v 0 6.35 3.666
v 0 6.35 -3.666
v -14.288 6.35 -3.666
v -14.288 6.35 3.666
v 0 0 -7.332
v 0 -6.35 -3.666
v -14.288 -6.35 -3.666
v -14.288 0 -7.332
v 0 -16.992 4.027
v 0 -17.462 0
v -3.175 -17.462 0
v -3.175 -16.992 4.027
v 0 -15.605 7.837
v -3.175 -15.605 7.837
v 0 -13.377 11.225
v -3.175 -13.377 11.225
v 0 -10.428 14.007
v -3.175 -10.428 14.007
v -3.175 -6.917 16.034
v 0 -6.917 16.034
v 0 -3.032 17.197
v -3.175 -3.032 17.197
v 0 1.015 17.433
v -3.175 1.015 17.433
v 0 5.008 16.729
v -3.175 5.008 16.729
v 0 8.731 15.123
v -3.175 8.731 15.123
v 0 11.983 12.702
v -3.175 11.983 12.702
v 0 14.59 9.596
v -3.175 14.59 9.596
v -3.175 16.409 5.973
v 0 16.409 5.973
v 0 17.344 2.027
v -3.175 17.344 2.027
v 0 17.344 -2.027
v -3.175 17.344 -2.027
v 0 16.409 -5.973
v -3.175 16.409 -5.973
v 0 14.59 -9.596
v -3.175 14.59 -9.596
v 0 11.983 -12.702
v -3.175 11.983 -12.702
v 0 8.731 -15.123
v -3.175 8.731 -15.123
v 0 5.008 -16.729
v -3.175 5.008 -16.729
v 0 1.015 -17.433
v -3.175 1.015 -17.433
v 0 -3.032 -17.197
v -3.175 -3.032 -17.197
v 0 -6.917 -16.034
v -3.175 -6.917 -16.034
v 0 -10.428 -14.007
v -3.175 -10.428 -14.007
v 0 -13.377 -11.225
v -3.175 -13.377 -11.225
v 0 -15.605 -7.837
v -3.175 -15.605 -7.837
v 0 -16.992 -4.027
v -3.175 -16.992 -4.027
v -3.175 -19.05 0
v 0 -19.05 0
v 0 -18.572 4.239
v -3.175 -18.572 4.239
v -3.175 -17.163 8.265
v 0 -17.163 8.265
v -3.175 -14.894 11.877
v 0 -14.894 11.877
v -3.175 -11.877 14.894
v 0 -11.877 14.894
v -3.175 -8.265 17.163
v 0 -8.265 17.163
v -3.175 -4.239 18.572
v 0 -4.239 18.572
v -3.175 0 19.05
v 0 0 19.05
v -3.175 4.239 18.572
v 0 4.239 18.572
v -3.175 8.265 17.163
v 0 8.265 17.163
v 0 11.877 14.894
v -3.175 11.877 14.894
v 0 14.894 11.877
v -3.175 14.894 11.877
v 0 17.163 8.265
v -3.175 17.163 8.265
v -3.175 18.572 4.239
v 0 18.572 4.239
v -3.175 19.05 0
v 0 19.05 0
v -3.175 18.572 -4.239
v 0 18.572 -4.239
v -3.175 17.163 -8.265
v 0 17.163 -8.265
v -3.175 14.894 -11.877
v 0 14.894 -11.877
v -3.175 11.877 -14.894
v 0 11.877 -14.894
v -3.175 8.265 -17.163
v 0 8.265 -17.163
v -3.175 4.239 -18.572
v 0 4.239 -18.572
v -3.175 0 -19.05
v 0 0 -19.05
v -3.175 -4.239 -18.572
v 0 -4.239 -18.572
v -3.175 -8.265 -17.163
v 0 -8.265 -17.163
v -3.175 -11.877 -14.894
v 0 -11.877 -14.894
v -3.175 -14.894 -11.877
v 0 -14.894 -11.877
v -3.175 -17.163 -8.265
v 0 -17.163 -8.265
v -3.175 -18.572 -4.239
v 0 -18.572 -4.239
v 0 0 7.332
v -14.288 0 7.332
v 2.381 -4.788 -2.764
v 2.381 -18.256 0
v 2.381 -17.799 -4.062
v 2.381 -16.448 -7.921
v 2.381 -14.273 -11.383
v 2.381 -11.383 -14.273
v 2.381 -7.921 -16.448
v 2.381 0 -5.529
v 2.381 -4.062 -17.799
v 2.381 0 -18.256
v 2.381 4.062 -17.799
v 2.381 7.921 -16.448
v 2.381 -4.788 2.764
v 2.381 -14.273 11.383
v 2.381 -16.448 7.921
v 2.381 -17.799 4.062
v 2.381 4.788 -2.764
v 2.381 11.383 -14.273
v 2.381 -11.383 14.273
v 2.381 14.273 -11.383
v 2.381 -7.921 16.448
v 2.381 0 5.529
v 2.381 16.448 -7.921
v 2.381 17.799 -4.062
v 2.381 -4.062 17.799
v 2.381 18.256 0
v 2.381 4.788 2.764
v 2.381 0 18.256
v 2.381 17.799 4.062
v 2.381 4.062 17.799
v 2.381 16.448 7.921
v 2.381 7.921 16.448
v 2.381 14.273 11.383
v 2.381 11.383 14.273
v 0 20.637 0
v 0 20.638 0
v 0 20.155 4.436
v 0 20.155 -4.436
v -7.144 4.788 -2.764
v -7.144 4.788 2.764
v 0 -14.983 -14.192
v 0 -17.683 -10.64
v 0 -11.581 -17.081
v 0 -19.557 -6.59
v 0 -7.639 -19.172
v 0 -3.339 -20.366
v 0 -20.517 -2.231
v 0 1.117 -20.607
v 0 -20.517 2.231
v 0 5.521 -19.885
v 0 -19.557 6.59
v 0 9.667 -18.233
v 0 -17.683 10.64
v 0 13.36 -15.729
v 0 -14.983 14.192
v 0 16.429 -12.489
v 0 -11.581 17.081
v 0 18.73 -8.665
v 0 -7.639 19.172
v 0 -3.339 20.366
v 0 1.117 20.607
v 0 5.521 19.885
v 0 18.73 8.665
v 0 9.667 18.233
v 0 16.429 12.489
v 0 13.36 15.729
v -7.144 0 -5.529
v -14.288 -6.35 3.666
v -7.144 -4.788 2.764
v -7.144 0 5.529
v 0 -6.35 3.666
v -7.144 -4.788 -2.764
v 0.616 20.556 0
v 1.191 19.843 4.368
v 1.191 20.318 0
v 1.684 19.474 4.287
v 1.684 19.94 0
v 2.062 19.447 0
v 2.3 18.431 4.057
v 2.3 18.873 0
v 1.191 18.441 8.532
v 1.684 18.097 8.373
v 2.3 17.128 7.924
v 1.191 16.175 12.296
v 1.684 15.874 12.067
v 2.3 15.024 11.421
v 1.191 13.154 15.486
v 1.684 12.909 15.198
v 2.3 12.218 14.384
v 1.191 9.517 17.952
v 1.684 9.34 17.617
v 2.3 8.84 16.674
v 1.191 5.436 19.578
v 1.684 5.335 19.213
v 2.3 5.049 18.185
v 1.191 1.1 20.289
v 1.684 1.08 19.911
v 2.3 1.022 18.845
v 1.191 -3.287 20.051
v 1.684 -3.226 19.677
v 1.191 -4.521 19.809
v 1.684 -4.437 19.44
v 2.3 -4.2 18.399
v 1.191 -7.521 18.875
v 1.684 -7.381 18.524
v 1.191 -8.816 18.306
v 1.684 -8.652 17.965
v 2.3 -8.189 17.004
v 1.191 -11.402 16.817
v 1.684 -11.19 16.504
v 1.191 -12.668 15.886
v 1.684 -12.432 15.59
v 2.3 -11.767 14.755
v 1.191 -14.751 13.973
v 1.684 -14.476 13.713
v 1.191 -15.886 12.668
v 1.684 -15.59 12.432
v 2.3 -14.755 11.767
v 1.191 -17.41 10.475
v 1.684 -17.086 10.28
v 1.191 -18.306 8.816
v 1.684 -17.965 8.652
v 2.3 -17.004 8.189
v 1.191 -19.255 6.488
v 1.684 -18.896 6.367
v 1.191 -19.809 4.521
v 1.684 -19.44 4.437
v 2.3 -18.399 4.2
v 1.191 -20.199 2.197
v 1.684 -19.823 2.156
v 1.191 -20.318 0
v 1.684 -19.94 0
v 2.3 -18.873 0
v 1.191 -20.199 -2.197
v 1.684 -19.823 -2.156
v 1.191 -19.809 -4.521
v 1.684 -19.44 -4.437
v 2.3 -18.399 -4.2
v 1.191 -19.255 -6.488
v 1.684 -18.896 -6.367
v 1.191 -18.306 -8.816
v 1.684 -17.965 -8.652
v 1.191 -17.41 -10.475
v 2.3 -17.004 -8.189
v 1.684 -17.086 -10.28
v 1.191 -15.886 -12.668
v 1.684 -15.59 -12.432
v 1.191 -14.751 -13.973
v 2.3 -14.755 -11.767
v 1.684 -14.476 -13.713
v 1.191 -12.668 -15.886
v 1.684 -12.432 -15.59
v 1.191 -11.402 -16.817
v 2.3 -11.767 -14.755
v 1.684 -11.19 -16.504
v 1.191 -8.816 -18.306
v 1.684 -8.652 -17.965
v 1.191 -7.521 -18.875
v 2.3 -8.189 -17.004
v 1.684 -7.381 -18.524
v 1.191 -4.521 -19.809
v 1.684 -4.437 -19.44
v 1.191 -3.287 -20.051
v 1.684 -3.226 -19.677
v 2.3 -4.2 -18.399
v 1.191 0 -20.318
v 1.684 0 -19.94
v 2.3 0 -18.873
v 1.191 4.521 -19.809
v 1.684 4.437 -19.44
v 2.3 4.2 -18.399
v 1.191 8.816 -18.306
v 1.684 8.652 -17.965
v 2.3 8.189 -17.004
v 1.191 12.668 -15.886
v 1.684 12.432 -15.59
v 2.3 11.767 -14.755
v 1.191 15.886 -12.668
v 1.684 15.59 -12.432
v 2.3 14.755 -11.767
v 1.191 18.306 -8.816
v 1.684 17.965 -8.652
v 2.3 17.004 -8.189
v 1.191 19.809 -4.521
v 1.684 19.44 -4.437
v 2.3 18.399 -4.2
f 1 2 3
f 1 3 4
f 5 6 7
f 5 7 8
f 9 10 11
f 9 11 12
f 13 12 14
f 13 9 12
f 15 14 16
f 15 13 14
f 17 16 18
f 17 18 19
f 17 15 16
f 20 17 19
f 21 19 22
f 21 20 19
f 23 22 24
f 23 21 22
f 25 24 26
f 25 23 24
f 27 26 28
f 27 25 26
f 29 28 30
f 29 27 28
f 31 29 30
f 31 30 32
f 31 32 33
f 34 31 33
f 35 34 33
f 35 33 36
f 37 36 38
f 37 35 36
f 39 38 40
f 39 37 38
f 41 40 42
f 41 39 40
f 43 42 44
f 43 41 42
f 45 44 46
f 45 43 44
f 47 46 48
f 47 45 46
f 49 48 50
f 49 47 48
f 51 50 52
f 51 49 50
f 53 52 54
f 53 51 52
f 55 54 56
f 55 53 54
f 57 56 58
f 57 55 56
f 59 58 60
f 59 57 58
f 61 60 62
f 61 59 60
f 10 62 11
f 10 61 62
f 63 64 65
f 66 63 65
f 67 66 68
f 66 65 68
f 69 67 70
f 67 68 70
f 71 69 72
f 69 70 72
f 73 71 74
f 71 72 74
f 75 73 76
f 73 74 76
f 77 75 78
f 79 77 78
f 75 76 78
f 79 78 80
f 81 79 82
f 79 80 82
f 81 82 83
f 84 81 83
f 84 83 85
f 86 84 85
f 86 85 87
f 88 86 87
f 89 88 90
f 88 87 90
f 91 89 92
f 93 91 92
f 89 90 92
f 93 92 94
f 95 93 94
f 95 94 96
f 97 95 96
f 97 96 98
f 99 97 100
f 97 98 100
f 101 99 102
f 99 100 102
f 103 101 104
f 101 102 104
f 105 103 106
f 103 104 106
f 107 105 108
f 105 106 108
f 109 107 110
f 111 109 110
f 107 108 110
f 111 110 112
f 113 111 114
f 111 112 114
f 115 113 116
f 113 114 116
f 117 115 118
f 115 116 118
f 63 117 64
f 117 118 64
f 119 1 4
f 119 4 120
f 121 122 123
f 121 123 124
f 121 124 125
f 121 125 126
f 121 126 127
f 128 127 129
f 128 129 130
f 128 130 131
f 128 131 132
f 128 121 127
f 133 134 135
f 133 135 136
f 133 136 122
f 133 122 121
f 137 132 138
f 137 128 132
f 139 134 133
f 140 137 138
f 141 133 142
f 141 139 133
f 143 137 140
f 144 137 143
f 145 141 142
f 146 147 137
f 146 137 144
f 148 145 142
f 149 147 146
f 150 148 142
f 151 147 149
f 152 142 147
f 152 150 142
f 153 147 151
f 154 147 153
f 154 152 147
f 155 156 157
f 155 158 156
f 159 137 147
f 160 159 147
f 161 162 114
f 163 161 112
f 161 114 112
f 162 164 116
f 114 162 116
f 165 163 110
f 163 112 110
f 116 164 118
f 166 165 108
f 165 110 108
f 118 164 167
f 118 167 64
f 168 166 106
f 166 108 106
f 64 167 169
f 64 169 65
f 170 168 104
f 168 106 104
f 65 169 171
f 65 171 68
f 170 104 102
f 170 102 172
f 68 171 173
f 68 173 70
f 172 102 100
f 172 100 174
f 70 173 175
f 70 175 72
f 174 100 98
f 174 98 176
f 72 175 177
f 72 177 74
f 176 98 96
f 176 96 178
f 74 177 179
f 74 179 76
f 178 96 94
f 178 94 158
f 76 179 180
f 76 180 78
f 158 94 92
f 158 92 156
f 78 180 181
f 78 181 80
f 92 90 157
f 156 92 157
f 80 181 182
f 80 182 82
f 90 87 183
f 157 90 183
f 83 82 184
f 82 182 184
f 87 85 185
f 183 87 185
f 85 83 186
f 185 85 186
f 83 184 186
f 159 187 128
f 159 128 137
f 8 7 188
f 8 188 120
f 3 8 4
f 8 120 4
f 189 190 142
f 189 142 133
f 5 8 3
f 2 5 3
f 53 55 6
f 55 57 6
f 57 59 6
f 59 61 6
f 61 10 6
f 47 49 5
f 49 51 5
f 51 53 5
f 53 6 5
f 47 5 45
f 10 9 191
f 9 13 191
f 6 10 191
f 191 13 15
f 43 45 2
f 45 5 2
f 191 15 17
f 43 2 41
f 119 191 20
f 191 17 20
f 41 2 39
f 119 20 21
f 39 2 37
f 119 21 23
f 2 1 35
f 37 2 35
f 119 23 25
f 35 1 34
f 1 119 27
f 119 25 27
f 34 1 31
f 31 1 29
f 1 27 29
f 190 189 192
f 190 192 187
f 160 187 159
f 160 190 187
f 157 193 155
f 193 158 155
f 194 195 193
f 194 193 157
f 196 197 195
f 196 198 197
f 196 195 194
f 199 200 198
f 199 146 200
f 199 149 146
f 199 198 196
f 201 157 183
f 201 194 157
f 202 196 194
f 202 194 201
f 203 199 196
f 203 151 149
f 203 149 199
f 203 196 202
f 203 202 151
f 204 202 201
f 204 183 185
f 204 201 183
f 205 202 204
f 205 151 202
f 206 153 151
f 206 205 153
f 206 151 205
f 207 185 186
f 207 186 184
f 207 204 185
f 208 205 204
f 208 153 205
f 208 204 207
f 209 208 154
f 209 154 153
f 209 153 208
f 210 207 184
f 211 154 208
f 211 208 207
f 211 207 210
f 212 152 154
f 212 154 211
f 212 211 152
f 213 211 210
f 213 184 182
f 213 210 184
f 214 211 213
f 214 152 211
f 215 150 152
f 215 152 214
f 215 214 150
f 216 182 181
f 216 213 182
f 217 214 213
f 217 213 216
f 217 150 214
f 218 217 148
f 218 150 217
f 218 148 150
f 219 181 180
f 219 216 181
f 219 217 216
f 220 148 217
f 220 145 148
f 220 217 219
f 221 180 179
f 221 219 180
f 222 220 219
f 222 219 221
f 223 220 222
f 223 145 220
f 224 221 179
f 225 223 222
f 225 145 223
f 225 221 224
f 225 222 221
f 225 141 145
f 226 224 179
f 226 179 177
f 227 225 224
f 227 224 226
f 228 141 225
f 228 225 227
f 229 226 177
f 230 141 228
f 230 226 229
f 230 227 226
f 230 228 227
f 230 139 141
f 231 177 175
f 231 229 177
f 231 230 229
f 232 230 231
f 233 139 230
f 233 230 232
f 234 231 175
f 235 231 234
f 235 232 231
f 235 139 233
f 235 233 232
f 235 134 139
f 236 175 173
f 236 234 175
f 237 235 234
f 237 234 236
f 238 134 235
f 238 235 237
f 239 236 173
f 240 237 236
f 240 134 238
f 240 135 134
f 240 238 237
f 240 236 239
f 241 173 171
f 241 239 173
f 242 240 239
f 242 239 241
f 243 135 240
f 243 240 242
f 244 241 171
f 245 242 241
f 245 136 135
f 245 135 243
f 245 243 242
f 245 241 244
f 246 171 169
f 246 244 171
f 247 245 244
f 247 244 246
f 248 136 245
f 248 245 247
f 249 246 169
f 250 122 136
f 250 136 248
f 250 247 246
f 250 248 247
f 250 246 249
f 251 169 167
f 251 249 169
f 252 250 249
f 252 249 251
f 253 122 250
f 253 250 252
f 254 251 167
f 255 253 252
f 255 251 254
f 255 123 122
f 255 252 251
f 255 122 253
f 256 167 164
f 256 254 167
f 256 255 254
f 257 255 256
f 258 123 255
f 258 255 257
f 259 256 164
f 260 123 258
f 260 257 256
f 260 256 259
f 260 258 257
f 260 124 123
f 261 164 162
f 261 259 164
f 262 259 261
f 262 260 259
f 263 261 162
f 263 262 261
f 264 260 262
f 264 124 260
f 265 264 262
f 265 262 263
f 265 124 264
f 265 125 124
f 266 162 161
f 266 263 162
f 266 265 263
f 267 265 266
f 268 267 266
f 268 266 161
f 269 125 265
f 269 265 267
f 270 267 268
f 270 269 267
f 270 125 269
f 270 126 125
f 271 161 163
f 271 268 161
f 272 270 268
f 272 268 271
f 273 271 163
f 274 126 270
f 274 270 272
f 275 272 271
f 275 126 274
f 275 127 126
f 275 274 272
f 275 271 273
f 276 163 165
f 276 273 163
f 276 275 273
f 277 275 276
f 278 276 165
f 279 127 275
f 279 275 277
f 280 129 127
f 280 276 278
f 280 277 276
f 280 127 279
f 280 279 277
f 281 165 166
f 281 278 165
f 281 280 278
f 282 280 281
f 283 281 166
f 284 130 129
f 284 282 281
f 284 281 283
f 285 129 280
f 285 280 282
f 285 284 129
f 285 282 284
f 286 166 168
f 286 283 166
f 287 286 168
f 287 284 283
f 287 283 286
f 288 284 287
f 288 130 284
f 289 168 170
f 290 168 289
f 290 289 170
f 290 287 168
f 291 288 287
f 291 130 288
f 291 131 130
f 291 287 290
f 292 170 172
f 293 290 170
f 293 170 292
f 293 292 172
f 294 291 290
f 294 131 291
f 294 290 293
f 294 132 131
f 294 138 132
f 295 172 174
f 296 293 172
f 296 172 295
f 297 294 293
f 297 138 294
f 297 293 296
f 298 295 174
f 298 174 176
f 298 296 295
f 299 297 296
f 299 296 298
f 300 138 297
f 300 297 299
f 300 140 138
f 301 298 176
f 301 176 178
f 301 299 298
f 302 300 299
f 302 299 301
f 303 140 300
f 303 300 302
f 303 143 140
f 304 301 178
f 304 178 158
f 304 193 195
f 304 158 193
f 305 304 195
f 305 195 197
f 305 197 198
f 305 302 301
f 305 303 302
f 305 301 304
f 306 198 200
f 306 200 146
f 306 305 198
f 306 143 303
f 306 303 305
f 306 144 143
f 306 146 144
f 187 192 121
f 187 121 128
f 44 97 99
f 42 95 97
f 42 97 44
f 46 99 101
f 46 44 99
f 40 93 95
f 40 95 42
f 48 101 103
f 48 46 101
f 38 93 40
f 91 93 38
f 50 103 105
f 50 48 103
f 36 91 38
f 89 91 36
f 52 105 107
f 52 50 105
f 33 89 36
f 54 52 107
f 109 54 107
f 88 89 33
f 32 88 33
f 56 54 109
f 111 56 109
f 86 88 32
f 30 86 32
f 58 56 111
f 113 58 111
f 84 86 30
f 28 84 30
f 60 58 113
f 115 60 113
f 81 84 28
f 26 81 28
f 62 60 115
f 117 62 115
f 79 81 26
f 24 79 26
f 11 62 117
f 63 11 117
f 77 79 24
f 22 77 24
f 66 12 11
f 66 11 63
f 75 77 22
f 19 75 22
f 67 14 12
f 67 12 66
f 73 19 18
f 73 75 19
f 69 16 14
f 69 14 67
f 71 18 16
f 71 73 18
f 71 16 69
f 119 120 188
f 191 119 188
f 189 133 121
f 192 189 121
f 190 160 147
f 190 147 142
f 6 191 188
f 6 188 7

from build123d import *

# Parameters (mm, degrees)
F1_DEPTH = 14.2875
F2_R     = 20.6375
F3_DEPTH = 2.38125
F5_DEPTH = 9.525
F6_R     = 19.05
F6_R_2   = 17.4625
F7_DEPTH = 3.175
F8_R     = 2.38124


# Not quite as in the source:
# - a fillet or chamfer is up to 0.001 mm smaller than in the source, because OpenCascade refuses the exact size


with BuildPart() as f1:
    # F0 (on Right) → F1 (new body)
    with BuildSketch(Plane.YZ):
        Polygon((6.35, -3.6661742094), (6.35, 3.6661742094), (0, 7.3323484187), (-6.35, 3.6661742094), (-6.35, -3.6661742094), (0, -7.3323484187), align=None)
    extrude(amount=-F1_DEPTH)

    # F2 (on Right) → F3 (join)
    with BuildSketch(Plane.YZ):
        Circle(F2_R)
    extrude(amount=F3_DEPTH)

    # F4 (on face) → F5 (cut)
    with BuildSketch(Plane.YZ.offset(2.38125)):
        Polygon((4.7879, -2.7642953539), (4.7879, 2.7642953539), (0, 5.5285907077), (-4.7879, 2.7642953539), (-4.7879, -2.7642953539), (0, -5.5285907077), align=None)
    extrude(amount=-F5_DEPTH, mode=Mode.SUBTRACT)

    # F6 (on face) → F7 (join)
    with BuildSketch(Plane(origin=(0, 0, 0), x_dir=(0, -1, 0), z_dir=(-1, 0, 0))):
        Circle(F6_R)
        Circle(F6_R_2, mode=Mode.SUBTRACT)
    extrude(amount=F7_DEPTH)

    # F8 (radius 2.38125 in the source; OpenCascade refuses exactly that, so slightly less here)
    f8_edges = [f1.edges().sort_by_distance(p)[0] for p in [
        (2.38125, -20.6375, 0),
    ]]
    fillet(f8_edges, radius=F8_R)


solid = f1.part
